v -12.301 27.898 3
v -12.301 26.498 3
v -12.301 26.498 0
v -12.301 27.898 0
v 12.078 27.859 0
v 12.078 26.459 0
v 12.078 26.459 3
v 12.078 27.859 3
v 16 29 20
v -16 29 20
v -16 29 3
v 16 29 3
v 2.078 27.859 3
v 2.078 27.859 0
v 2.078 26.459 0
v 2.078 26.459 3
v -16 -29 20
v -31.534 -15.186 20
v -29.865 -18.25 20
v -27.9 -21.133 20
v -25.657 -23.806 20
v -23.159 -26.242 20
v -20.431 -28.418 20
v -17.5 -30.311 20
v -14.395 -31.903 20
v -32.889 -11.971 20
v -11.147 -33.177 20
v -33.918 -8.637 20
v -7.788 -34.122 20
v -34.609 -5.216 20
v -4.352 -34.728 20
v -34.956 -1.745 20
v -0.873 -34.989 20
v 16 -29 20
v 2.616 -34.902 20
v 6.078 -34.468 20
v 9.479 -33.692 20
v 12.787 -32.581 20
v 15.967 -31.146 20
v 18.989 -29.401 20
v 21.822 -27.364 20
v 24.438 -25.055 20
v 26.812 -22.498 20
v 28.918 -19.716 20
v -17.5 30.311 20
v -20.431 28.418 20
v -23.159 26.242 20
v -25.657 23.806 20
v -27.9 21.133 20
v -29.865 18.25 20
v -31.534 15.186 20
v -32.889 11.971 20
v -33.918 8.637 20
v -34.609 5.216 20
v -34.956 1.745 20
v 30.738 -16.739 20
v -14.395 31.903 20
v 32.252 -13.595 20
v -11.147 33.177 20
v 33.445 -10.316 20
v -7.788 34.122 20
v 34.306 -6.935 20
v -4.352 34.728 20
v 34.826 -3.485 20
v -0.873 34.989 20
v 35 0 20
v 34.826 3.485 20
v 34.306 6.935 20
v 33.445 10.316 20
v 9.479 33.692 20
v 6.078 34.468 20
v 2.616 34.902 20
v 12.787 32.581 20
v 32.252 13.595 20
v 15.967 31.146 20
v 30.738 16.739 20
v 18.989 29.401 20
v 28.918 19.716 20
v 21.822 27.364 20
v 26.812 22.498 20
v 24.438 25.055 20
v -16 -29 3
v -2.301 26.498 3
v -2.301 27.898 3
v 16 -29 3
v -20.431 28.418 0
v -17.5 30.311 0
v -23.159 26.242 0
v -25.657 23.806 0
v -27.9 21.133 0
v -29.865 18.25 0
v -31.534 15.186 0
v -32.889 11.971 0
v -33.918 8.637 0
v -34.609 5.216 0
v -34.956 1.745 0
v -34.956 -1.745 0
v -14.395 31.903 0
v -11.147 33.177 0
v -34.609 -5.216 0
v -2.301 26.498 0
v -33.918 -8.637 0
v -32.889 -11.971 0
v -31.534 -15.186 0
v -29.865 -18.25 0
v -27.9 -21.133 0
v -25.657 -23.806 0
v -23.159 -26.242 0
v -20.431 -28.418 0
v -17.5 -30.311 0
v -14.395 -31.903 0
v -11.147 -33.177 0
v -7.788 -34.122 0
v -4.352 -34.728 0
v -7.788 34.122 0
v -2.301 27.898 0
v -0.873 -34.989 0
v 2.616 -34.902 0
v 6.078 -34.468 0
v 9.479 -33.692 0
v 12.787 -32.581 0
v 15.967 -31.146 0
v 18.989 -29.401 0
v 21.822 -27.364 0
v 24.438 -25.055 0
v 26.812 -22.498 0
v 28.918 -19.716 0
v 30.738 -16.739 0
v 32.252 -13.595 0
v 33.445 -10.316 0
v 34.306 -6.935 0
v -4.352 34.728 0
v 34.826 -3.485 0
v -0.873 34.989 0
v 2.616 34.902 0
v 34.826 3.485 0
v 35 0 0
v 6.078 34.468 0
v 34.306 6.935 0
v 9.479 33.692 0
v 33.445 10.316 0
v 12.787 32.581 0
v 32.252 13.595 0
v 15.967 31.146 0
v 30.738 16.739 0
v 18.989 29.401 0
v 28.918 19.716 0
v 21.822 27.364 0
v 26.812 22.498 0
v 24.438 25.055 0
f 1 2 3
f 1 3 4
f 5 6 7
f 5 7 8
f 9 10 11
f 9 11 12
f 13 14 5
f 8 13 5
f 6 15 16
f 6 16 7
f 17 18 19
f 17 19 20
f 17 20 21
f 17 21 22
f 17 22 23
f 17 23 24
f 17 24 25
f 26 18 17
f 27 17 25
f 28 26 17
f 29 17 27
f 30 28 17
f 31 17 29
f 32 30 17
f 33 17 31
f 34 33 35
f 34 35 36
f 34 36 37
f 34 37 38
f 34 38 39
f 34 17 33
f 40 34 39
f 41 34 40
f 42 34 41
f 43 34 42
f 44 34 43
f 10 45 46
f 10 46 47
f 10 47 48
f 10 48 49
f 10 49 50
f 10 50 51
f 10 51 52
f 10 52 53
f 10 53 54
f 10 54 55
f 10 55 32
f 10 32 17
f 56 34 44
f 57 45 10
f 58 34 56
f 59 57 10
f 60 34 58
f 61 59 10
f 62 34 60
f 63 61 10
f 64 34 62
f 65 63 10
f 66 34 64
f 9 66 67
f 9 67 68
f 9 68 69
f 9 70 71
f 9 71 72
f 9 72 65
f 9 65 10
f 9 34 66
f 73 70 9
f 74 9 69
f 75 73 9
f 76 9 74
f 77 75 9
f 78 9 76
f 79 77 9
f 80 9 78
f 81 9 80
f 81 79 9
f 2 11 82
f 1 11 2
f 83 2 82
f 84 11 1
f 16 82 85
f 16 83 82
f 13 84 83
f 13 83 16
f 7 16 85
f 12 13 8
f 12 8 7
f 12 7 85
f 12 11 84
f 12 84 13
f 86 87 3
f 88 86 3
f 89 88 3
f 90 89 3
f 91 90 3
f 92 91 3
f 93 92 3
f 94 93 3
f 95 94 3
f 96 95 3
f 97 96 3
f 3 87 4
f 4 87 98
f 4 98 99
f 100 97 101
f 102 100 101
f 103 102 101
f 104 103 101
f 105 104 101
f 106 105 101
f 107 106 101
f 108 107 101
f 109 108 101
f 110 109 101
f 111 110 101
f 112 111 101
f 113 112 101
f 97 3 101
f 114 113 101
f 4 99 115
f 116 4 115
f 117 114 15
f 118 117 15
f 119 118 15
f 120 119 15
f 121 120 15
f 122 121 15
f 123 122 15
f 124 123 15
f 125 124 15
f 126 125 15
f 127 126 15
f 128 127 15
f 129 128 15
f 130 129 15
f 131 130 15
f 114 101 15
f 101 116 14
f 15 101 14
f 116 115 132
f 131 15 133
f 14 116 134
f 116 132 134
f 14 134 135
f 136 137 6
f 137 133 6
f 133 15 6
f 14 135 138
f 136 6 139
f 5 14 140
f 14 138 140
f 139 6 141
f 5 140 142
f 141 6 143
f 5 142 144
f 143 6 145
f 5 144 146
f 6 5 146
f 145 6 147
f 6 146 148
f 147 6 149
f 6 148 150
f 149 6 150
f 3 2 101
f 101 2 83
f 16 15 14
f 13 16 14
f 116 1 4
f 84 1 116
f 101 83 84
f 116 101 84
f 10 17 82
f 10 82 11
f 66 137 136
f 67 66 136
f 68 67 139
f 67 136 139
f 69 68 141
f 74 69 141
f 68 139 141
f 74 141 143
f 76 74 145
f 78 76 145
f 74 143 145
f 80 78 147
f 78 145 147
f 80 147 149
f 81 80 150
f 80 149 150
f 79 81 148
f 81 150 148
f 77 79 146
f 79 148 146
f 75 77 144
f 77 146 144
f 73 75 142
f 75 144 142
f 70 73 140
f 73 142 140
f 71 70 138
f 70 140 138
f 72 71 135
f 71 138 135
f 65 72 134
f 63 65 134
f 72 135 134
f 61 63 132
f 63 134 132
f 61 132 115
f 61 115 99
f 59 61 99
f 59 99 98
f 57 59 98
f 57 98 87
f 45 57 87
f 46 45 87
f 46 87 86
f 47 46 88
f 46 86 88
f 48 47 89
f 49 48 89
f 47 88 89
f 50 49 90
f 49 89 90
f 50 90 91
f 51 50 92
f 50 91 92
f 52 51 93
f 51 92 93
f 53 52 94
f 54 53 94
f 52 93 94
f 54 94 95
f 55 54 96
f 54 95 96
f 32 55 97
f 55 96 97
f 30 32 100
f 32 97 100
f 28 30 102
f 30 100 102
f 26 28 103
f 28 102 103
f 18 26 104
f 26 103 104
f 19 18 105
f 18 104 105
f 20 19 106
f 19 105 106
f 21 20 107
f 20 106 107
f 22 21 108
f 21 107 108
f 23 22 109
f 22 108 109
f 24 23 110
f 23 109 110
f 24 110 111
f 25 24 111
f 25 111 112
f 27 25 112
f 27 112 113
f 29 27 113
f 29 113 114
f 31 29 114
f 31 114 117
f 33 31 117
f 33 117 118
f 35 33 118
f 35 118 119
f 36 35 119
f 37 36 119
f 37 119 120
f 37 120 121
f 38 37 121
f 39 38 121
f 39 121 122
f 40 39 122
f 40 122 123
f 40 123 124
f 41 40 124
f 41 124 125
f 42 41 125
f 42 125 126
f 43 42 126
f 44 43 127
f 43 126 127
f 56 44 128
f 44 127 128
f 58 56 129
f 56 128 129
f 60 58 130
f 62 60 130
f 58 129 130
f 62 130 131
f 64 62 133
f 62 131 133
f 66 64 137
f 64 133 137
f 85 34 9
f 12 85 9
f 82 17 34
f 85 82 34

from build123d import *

# Parameters (mm, degrees)
F0_R     = 35
F1_DEPTH = 20
F2_W     = 32
F2_H     = 58
F3_DEPTH = 17
F4_W     = 10
F4_H     = 1.4
F5_DEPTH = 5
F6_W     = 10
F6_H     = 1.4
F7_DEPTH = 5


with BuildPart() as f1:
    # F0 (on Top) → F1 (new body)
    with BuildSketch(Plane.XY):
        Circle(F0_R)
    extrude(amount=F1_DEPTH)

    # F2 (on face) → F3 (cut)
    with BuildSketch(Plane.XY.offset(20)):
        Rectangle(F2_W, F2_H)
    extrude(amount=-F3_DEPTH, mode=Mode.SUBTRACT)

    # F4 (on face) → F5 (cut)
    with BuildSketch(Plane.XY.offset(3)):
        with Locations((-7.300642, 27.198469)):
            Rectangle(F4_W, F4_H)
    extrude(amount=-F5_DEPTH, mode=Mode.SUBTRACT)

    # F6 (on Top) → F7 (cut)
    with BuildSketch(Plane.XY):
        with Locations((7.077963, 27.159134)):
            Rectangle(F6_W, F6_H)
    extrude(amount=F7_DEPTH, mode=Mode.SUBTRACT)


solid = f1.part
